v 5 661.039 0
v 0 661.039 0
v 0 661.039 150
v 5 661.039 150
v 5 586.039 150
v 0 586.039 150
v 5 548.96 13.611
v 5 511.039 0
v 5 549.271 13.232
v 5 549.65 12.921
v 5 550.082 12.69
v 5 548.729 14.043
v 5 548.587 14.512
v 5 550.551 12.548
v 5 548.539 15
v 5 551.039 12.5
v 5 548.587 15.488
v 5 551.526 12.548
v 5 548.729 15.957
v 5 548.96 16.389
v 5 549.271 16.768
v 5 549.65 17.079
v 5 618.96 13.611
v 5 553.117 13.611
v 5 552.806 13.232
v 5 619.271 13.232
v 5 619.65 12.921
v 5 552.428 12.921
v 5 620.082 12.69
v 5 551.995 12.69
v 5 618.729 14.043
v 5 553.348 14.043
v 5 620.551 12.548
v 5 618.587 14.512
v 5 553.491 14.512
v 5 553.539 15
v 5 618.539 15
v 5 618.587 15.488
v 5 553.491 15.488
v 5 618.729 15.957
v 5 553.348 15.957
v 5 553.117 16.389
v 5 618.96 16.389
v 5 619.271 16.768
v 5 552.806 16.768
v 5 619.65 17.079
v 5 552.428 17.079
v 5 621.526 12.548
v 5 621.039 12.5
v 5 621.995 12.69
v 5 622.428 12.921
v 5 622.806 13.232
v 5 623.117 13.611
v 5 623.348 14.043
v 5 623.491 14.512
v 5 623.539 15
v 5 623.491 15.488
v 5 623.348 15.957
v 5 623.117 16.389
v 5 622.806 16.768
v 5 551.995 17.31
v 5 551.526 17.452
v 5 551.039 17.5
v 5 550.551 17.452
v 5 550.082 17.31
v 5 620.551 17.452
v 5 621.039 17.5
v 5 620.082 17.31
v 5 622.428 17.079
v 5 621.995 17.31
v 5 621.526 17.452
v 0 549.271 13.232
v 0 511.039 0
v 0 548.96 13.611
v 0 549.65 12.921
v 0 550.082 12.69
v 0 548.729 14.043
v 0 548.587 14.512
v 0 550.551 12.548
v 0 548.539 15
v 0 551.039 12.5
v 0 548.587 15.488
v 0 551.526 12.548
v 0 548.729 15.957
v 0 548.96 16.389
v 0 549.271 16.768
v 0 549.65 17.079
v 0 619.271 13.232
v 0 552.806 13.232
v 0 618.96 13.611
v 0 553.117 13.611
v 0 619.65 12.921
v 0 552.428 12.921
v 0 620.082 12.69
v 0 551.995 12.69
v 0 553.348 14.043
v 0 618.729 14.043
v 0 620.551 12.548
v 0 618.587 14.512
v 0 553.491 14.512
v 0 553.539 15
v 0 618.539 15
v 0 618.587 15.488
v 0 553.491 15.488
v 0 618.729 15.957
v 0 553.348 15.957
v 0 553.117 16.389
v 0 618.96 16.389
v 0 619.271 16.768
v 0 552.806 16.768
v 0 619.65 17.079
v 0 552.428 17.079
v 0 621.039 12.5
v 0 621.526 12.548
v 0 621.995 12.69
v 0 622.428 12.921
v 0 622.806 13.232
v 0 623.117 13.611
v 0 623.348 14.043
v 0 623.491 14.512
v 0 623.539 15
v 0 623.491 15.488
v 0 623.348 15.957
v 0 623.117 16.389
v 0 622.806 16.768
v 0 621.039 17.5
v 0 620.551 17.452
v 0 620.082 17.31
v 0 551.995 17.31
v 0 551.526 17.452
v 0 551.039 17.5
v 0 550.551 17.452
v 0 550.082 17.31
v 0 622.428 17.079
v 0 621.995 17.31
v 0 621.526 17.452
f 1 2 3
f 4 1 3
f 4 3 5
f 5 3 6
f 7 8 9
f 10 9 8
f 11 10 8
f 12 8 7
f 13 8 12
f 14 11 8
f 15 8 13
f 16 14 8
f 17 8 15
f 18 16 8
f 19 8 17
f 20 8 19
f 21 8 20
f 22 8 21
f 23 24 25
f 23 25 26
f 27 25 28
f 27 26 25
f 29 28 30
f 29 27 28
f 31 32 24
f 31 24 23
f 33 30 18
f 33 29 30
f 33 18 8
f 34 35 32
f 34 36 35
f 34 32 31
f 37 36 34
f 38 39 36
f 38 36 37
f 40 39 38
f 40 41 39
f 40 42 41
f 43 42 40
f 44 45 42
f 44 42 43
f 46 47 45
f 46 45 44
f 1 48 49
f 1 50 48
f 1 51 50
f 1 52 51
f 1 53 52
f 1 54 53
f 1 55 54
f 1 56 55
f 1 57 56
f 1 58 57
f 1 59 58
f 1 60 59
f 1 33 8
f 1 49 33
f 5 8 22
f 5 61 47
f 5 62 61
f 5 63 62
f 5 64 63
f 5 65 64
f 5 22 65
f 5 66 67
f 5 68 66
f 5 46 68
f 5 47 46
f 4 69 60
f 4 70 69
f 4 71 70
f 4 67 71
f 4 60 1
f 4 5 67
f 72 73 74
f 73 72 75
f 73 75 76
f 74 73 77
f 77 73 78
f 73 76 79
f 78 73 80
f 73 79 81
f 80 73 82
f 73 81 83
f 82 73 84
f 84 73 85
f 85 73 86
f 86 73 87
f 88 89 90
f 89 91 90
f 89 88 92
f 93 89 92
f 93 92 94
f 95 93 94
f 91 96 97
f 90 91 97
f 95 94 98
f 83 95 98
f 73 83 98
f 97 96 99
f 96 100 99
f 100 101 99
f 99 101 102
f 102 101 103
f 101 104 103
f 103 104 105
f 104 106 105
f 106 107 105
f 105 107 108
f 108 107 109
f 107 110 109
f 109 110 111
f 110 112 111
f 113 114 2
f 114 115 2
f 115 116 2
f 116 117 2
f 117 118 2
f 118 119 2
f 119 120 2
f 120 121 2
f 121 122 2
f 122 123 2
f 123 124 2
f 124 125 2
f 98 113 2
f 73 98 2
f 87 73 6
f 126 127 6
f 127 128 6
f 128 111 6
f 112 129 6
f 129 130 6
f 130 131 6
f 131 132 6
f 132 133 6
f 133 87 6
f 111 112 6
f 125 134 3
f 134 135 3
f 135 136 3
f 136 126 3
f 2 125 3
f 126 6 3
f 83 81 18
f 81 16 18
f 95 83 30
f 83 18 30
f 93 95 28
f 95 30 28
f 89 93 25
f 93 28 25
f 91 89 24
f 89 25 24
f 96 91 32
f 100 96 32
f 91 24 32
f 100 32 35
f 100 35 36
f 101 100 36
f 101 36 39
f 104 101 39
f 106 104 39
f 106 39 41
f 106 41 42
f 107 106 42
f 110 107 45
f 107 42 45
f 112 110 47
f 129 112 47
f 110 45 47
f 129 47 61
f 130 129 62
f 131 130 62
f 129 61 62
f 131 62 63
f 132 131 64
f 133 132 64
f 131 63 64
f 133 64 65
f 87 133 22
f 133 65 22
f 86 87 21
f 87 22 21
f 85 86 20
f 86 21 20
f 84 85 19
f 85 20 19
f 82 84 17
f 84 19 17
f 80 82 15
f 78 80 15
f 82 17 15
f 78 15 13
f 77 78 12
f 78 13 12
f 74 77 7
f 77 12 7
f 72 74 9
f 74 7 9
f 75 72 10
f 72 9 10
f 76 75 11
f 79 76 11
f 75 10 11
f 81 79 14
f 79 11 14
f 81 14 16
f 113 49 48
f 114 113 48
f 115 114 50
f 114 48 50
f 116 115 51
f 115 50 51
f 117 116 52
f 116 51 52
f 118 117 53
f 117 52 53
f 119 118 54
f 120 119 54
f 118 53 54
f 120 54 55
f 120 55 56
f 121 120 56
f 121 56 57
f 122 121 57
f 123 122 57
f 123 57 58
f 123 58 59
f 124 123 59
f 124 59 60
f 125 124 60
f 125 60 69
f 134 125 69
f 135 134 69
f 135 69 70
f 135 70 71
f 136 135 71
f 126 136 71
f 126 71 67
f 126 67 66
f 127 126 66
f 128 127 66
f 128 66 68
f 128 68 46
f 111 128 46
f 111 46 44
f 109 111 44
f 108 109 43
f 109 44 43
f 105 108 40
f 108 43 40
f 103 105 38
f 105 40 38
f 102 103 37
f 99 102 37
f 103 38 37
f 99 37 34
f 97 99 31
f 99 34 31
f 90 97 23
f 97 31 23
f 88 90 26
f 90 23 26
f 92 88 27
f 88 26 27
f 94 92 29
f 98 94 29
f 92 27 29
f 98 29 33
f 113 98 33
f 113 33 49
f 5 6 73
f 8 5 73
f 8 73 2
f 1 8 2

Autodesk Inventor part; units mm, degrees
ref_plane "YZ Plane" through (0, 0, 0) normal (1, 0, 0) x (0, 1, 0)
ref_plane "XZ Plane" through (0, 0, 0) normal (0, 1, 0) x (-1, 0, 0)
ref_plane "XY Plane" through (0, 0, 0) normal (0, 0, 1) x (1, 0, 0)
sketch "Sketch1" plane through (0, 0, 0) normal (1, 0, 0) x (0, 1, 0)
  line L0 (0, 0) -> (661.0386, 0)
  line L1 (661.0386, 0) -> (661.0386, 150)
  line L2 (661.0386, 0) -> (511.0386, 0)
  line L3 (661.0386, 150) -> (586.0386, 150)
  line L4 (586.0386, 150) -> (511.0386, 0)
  point P0 (0, 0)
  dimension "d0" = 150
  dimension "d1" = 150
  dimension "d2" = 75
extrude "Plate1" add sketch "Sketch1" along normal blind 5
sketch "Sketch2" plane through (5, 0, 0) normal (1, 0, 0) x (0, 0, -1)
  line L0 (-150, 661.0386) -> (0, 661.0386) projected
  line L1 (0, 661.0386) -> (0, 511.0386) projected
  circle A0 centre (-15, 621.0386) radius 2.5
  line L2 (0, 511.0386) -> (0, 661.0386) projected
  line L3 (0, 586.0386) -> (-15, 586.0386)
  circle A1 centre (-15, 551.0386) radius 2.5
  point P0 (0, 0)
  dimension "d4" = 40
  dimension "d5" = 15
  dimension "d6" = 5
extrude "Extrusion1" cut sketch "Sketch2" along normal mid plane 10
equation "\"d3\" = Thickness"
equation "\"BendRadius\" = Thickness"
equation "\"BendReliefWidth\" = Thickness"
equation "\"BendReliefDepth\" = 0.5 * Thickness"
equation "\"TransitionRadius\" = BendRadius"
equation "\"JacobiRadiusSize\" = BendRadius"
equation "\"GapSize\" = Thickness"
equation "\"Thickness\" = 5"
properties part number "rudder"
